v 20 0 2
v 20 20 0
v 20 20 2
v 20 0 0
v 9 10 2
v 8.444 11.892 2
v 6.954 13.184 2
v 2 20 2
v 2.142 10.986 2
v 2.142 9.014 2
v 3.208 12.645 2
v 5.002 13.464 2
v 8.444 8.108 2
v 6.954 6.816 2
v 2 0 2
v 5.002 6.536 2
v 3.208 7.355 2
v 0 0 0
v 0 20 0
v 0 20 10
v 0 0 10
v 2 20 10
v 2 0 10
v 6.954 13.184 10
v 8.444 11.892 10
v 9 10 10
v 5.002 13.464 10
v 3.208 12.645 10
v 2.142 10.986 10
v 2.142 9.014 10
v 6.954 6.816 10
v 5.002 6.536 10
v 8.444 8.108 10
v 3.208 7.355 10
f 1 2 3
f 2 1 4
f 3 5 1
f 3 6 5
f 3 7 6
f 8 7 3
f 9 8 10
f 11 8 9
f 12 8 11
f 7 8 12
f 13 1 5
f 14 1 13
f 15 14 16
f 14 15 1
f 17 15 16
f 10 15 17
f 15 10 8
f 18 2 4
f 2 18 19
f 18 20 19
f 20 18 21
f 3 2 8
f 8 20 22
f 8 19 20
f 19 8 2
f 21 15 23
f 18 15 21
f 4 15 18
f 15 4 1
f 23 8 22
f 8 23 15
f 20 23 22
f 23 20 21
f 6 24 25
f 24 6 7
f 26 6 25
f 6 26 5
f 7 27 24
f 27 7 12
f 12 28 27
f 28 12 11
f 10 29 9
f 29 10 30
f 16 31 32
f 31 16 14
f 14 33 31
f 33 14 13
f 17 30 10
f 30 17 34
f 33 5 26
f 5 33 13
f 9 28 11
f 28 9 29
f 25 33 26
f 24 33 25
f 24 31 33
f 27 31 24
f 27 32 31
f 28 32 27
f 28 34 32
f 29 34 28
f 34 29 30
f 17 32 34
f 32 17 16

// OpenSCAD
// F9a: ABSTURZ (Segmentation fault, Exit 139) von `cad check`: union(fillet = …) aus Platte,
// Wand und einem Zylinder, der die Wand tangential berührt (Schraubdom an der Wand). Ohne
// fillet oder mit Abstand zur Wand kein Absturz. Im Gehäuse umgangen (Dome frei stehend).
// ERWARTET: kein Absturz
union(fillet = 1) {
    cube([20, 20, 2]);
    cube([2, 20, 10]);
    translate([5.5, 10, 0]) cylinder(h = 10, r = 3.5);
}
